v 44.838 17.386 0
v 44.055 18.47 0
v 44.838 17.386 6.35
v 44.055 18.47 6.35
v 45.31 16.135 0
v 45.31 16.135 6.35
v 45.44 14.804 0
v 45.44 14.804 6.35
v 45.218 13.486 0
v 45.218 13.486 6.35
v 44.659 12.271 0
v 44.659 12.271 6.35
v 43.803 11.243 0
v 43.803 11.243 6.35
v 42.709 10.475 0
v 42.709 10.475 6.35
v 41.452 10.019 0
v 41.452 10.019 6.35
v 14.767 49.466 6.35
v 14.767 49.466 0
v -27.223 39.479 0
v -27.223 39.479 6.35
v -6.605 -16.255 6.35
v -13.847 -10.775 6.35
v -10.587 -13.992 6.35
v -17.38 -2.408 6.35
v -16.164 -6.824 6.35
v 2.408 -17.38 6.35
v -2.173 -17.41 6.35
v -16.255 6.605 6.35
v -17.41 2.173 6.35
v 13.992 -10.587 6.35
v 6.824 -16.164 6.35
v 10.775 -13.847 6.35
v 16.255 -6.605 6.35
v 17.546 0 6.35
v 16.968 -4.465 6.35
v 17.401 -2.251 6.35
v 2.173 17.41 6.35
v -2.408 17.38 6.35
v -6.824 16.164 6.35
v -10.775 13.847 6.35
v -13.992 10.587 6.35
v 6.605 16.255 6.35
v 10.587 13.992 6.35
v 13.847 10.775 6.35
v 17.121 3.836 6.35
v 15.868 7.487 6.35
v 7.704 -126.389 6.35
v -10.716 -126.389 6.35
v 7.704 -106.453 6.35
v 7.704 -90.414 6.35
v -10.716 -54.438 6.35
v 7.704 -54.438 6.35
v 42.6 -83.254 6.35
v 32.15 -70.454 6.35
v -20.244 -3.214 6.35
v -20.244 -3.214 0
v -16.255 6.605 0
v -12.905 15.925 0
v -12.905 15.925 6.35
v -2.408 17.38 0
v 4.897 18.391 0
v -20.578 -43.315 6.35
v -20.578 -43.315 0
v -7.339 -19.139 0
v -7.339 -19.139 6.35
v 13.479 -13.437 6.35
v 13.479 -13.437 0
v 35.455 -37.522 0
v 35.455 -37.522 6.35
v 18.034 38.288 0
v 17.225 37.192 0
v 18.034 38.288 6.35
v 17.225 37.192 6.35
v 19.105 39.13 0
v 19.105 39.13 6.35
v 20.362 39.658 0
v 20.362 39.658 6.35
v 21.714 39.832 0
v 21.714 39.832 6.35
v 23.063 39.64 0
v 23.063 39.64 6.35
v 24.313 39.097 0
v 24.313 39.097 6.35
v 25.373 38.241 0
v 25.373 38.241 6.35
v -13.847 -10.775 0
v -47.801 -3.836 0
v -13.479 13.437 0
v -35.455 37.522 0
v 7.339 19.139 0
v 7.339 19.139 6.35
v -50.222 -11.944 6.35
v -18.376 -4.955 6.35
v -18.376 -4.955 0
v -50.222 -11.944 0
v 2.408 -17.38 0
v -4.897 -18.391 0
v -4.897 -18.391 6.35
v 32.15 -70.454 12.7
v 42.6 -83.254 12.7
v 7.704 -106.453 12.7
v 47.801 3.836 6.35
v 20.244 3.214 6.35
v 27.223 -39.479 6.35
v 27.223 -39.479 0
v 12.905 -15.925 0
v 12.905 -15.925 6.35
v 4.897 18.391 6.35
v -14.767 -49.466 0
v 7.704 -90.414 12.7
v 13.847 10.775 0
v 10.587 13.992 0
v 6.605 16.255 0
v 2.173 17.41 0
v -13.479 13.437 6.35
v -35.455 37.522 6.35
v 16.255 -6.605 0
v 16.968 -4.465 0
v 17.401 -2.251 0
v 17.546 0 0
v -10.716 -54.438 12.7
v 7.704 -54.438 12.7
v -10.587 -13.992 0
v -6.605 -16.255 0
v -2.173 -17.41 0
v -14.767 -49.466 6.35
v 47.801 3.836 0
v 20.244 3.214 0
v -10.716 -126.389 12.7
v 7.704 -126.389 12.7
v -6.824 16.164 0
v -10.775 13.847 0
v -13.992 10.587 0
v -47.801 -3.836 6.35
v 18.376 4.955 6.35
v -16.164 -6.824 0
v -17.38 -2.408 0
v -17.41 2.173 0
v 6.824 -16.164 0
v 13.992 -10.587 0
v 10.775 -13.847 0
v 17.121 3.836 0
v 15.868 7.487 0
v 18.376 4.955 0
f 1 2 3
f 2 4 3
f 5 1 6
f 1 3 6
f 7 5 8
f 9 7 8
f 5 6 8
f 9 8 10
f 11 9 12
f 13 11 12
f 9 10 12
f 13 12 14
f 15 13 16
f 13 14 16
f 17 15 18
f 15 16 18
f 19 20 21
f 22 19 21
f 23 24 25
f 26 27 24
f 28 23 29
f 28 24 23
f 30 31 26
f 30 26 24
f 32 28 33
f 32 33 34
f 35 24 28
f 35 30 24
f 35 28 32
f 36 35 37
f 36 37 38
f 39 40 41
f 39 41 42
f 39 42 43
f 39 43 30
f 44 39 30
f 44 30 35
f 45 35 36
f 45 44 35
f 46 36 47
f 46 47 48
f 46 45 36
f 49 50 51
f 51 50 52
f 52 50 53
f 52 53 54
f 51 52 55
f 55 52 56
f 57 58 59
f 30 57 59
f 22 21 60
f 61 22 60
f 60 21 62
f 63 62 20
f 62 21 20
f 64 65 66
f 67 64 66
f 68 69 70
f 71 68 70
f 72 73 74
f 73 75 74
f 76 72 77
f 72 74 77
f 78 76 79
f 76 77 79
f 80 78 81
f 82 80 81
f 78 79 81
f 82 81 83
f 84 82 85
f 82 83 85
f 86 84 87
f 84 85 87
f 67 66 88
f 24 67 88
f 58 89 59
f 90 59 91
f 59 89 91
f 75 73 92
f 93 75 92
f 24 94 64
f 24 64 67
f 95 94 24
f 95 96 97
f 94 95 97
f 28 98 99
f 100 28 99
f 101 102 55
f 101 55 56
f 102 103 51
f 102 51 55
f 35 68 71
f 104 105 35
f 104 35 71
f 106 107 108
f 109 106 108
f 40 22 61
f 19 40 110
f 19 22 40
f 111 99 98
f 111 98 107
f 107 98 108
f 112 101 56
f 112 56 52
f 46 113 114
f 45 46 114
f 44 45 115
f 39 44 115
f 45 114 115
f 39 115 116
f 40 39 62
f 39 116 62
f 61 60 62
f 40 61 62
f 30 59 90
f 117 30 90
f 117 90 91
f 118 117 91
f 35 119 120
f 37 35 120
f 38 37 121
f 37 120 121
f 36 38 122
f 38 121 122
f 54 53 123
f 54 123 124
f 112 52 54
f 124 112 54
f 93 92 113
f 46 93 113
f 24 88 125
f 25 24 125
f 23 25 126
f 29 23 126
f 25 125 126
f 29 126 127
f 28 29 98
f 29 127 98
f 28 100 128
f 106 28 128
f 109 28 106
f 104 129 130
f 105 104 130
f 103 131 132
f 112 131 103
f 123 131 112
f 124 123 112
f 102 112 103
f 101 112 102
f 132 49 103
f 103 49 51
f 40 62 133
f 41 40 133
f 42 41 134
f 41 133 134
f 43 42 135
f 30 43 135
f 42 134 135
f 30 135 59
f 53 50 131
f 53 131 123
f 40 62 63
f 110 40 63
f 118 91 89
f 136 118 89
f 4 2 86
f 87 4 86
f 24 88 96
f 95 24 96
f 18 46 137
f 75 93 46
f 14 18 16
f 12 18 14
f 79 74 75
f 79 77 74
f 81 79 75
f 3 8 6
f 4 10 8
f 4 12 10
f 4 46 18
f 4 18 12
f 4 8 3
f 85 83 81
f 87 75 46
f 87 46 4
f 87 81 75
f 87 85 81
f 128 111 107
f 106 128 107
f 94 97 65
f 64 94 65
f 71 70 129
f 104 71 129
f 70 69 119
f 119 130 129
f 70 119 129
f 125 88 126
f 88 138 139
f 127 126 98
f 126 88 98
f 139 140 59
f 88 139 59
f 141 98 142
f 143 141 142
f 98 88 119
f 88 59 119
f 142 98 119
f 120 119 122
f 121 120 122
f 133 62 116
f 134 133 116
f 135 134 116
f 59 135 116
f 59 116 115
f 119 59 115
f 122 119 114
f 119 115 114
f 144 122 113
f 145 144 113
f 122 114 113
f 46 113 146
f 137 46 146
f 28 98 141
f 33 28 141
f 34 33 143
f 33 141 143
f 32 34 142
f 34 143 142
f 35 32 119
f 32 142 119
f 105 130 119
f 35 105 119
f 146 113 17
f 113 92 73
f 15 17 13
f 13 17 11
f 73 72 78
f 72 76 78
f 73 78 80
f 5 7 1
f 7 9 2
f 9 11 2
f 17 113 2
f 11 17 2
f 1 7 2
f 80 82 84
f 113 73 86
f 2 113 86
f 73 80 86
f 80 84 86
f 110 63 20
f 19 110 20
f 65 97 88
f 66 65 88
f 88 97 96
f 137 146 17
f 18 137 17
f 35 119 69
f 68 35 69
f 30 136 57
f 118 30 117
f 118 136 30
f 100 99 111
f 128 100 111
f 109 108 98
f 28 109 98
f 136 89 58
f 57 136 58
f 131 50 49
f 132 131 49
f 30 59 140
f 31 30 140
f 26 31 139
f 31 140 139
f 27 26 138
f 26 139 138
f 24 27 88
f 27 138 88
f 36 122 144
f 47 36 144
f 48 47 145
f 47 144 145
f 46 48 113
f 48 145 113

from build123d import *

# Parameters (mm, degrees)
F1_DEPTH = 6.35
F2_R     = 5.08
F3_W     = 18.419568
F3_H     = 71.951434
F4_DEPTH = 6.35
F6_DEPTH = 6.35


with BuildPart() as f1:
    # F0 (on Top) → F1 (new body)
    with BuildSketch(Plane.XY):
        Polygon((-12.905409, 15.925343), (-2.407523, 17.379573), (4.897188, 18.391466), (14.767297, 49.465586), (-27.222635, 39.478553), align=None)
        Polygon((-20.244456, -3.213741), (-16.254913, 6.60481), (-13.478883, 13.436822), (-35.454806, 37.521647), (-47.800747, -3.836217), align=None)
        Polygon((7.339047, 19.139083), (13.84739, 10.774763), (18.376071, 4.954644), (50.222103, 11.943939), (20.578112, 43.31477), align=None)
        with BuildLine():
            ThreePointArc((16.254913, -6.60481), (17.219856, -3.364863), (17.545533, 0))
            ThreePointArc((17.545533, 0), (16.595264, 5.695871), (13.84739, 10.774763))
            ThreePointArc((13.84739, 10.774763), (6.60481, 16.254913), (-2.407523, 17.379573))
            ThreePointArc((-2.407523, 17.379573), (-10.774763, 13.84739), (-16.254913, 6.60481))
            ThreePointArc((-16.254913, 6.60481), (-17.379573, -2.407523), (-13.84739, -10.774763))
            ThreePointArc((-13.84739, -10.774763), (-6.60481, -16.254914), (2.407524, -17.379573))
            ThreePointArc((2.407524, -17.379573), (10.774763, -13.84739), (16.254913, -6.60481))
        make_face()
        Polygon((20.244456, 3.213741), (16.254913, -6.60481), (13.478883, -13.436822), (35.454806, -37.521647), (47.800747, 3.836217), align=None)
        Polygon((12.905409, -15.925343), (2.407524, -17.379573), (-4.897188, -18.391466), (-14.767297, -49.465586), (27.222635, -39.478553), align=None)
        Polygon((-7.339047, -19.139083), (-13.84739, -10.774763), (-18.376071, -4.954644), (-50.222103, -11.943939), (-20.578112, -43.31477), align=None)
    extrude(amount=F1_DEPTH)

    # F2
    f2_edges = [f1.edges().sort_by_distance(p)[0] for p in [
        (50.222103, 11.943939, 3.175),
        (20.578112, 43.31477, 3.175),
    ]]
    fillet(f2_edges, radius=F2_R)


with BuildPart() as f4:
    # F3 (on face) → F4 (new body)
    with BuildSketch(Plane.XY.offset(6.35)):
        with Locations((-1.505811, -90.413667)):
            Rectangle(F3_W, F3_H)
    extrude(amount=F4_DEPTH)

    # F5 (on face) → F6 (join)
    with BuildSketch(Plane.XY.offset(12.7)):
        Polygon((32.14987, -70.454188), (7.703973, -90.413667), (7.703973, -106.452689), (42.60036, -83.2537), align=None)
    extrude(amount=-F6_DEPTH)


solid = Compound([f1.part, f4.part])
